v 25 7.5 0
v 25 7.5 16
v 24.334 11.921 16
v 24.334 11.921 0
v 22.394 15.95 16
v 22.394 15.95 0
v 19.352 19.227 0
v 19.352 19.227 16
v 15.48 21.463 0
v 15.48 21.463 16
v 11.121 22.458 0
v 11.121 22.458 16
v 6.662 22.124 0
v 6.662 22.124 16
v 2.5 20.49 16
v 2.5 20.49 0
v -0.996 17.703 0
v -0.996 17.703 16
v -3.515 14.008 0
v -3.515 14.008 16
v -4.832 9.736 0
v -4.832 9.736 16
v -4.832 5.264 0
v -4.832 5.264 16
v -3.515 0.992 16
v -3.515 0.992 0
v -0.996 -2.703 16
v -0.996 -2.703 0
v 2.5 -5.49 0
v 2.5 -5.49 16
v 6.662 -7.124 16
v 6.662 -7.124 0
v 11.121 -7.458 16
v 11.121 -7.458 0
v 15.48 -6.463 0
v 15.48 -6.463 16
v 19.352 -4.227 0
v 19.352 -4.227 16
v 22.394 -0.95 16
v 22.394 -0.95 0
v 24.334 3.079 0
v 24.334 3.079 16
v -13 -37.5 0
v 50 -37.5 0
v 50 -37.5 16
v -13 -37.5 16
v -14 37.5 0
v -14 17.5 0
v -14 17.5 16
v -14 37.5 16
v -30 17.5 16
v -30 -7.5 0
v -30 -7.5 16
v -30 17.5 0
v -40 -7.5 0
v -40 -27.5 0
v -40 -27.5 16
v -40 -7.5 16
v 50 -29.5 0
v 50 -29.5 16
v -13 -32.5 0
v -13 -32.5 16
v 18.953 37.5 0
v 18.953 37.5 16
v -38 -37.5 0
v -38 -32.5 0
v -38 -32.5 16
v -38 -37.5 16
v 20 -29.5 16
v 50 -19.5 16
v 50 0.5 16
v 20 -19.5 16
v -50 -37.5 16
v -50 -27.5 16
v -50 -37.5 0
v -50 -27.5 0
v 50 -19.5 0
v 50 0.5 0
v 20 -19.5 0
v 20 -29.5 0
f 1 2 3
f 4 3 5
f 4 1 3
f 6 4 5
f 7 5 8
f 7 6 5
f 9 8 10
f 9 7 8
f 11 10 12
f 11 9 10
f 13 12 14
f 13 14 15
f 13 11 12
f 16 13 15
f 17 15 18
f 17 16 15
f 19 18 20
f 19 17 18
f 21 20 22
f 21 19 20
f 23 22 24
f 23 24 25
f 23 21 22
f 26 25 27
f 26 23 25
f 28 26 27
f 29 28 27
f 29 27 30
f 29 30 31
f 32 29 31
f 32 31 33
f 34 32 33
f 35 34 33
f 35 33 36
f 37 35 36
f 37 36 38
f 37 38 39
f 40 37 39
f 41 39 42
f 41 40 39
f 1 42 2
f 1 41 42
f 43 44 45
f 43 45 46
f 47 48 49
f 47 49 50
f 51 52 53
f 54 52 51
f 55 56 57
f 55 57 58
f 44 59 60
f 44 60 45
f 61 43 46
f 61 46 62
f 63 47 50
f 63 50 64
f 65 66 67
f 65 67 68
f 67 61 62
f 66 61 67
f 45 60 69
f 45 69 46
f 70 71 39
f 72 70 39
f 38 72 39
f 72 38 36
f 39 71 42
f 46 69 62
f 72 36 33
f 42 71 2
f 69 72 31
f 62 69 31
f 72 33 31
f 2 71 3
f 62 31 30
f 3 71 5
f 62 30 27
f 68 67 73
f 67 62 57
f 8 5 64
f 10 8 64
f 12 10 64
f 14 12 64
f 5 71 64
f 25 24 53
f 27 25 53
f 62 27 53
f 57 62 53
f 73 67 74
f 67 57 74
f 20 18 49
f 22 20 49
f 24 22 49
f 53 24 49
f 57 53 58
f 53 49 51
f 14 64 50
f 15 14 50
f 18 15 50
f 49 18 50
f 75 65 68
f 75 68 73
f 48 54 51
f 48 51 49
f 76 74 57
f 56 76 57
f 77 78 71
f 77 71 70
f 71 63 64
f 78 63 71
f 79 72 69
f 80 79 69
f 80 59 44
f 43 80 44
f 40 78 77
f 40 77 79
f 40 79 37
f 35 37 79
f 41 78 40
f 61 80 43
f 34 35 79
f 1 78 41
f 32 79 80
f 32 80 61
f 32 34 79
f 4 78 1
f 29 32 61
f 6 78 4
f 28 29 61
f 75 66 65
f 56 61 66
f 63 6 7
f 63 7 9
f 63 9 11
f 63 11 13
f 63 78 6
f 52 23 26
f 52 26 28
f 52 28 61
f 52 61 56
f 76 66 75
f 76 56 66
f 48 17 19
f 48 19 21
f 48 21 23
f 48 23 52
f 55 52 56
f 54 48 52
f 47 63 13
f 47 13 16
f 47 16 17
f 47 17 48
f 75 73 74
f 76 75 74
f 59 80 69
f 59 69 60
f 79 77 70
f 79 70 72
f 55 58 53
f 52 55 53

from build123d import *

# Parameters (mm, degrees)
SKETCH2_R           = 15
BOSS_EXTRUDE1_DEPTH = 16


with BuildPart() as part:
    # Sketch2 → Boss-Extrude1 (new body)
    with BuildSketch(Plane.XY):
        Polygon((18.953313646, 37.5), (50, 0.5), (50, -19.5), (20, -19.5), (20, -29.5), (50, -29.5), (50, -37.5), (-13, -37.5), (-13, -32.5), (-38, -32.5), (-38, -37.5), (-50, -37.5), (-50, -27.5), (-40, -27.5), (-40, -7.5), (-30, -7.5), (-30, 17.5), (-14, 17.5), (-14, 37.5), align=None)
        with Locations((10, 7.5)):
            Circle(SKETCH2_R, mode=Mode.SUBTRACT)
    extrude(amount=BOSS_EXTRUDE1_DEPTH)


solid = part.part
